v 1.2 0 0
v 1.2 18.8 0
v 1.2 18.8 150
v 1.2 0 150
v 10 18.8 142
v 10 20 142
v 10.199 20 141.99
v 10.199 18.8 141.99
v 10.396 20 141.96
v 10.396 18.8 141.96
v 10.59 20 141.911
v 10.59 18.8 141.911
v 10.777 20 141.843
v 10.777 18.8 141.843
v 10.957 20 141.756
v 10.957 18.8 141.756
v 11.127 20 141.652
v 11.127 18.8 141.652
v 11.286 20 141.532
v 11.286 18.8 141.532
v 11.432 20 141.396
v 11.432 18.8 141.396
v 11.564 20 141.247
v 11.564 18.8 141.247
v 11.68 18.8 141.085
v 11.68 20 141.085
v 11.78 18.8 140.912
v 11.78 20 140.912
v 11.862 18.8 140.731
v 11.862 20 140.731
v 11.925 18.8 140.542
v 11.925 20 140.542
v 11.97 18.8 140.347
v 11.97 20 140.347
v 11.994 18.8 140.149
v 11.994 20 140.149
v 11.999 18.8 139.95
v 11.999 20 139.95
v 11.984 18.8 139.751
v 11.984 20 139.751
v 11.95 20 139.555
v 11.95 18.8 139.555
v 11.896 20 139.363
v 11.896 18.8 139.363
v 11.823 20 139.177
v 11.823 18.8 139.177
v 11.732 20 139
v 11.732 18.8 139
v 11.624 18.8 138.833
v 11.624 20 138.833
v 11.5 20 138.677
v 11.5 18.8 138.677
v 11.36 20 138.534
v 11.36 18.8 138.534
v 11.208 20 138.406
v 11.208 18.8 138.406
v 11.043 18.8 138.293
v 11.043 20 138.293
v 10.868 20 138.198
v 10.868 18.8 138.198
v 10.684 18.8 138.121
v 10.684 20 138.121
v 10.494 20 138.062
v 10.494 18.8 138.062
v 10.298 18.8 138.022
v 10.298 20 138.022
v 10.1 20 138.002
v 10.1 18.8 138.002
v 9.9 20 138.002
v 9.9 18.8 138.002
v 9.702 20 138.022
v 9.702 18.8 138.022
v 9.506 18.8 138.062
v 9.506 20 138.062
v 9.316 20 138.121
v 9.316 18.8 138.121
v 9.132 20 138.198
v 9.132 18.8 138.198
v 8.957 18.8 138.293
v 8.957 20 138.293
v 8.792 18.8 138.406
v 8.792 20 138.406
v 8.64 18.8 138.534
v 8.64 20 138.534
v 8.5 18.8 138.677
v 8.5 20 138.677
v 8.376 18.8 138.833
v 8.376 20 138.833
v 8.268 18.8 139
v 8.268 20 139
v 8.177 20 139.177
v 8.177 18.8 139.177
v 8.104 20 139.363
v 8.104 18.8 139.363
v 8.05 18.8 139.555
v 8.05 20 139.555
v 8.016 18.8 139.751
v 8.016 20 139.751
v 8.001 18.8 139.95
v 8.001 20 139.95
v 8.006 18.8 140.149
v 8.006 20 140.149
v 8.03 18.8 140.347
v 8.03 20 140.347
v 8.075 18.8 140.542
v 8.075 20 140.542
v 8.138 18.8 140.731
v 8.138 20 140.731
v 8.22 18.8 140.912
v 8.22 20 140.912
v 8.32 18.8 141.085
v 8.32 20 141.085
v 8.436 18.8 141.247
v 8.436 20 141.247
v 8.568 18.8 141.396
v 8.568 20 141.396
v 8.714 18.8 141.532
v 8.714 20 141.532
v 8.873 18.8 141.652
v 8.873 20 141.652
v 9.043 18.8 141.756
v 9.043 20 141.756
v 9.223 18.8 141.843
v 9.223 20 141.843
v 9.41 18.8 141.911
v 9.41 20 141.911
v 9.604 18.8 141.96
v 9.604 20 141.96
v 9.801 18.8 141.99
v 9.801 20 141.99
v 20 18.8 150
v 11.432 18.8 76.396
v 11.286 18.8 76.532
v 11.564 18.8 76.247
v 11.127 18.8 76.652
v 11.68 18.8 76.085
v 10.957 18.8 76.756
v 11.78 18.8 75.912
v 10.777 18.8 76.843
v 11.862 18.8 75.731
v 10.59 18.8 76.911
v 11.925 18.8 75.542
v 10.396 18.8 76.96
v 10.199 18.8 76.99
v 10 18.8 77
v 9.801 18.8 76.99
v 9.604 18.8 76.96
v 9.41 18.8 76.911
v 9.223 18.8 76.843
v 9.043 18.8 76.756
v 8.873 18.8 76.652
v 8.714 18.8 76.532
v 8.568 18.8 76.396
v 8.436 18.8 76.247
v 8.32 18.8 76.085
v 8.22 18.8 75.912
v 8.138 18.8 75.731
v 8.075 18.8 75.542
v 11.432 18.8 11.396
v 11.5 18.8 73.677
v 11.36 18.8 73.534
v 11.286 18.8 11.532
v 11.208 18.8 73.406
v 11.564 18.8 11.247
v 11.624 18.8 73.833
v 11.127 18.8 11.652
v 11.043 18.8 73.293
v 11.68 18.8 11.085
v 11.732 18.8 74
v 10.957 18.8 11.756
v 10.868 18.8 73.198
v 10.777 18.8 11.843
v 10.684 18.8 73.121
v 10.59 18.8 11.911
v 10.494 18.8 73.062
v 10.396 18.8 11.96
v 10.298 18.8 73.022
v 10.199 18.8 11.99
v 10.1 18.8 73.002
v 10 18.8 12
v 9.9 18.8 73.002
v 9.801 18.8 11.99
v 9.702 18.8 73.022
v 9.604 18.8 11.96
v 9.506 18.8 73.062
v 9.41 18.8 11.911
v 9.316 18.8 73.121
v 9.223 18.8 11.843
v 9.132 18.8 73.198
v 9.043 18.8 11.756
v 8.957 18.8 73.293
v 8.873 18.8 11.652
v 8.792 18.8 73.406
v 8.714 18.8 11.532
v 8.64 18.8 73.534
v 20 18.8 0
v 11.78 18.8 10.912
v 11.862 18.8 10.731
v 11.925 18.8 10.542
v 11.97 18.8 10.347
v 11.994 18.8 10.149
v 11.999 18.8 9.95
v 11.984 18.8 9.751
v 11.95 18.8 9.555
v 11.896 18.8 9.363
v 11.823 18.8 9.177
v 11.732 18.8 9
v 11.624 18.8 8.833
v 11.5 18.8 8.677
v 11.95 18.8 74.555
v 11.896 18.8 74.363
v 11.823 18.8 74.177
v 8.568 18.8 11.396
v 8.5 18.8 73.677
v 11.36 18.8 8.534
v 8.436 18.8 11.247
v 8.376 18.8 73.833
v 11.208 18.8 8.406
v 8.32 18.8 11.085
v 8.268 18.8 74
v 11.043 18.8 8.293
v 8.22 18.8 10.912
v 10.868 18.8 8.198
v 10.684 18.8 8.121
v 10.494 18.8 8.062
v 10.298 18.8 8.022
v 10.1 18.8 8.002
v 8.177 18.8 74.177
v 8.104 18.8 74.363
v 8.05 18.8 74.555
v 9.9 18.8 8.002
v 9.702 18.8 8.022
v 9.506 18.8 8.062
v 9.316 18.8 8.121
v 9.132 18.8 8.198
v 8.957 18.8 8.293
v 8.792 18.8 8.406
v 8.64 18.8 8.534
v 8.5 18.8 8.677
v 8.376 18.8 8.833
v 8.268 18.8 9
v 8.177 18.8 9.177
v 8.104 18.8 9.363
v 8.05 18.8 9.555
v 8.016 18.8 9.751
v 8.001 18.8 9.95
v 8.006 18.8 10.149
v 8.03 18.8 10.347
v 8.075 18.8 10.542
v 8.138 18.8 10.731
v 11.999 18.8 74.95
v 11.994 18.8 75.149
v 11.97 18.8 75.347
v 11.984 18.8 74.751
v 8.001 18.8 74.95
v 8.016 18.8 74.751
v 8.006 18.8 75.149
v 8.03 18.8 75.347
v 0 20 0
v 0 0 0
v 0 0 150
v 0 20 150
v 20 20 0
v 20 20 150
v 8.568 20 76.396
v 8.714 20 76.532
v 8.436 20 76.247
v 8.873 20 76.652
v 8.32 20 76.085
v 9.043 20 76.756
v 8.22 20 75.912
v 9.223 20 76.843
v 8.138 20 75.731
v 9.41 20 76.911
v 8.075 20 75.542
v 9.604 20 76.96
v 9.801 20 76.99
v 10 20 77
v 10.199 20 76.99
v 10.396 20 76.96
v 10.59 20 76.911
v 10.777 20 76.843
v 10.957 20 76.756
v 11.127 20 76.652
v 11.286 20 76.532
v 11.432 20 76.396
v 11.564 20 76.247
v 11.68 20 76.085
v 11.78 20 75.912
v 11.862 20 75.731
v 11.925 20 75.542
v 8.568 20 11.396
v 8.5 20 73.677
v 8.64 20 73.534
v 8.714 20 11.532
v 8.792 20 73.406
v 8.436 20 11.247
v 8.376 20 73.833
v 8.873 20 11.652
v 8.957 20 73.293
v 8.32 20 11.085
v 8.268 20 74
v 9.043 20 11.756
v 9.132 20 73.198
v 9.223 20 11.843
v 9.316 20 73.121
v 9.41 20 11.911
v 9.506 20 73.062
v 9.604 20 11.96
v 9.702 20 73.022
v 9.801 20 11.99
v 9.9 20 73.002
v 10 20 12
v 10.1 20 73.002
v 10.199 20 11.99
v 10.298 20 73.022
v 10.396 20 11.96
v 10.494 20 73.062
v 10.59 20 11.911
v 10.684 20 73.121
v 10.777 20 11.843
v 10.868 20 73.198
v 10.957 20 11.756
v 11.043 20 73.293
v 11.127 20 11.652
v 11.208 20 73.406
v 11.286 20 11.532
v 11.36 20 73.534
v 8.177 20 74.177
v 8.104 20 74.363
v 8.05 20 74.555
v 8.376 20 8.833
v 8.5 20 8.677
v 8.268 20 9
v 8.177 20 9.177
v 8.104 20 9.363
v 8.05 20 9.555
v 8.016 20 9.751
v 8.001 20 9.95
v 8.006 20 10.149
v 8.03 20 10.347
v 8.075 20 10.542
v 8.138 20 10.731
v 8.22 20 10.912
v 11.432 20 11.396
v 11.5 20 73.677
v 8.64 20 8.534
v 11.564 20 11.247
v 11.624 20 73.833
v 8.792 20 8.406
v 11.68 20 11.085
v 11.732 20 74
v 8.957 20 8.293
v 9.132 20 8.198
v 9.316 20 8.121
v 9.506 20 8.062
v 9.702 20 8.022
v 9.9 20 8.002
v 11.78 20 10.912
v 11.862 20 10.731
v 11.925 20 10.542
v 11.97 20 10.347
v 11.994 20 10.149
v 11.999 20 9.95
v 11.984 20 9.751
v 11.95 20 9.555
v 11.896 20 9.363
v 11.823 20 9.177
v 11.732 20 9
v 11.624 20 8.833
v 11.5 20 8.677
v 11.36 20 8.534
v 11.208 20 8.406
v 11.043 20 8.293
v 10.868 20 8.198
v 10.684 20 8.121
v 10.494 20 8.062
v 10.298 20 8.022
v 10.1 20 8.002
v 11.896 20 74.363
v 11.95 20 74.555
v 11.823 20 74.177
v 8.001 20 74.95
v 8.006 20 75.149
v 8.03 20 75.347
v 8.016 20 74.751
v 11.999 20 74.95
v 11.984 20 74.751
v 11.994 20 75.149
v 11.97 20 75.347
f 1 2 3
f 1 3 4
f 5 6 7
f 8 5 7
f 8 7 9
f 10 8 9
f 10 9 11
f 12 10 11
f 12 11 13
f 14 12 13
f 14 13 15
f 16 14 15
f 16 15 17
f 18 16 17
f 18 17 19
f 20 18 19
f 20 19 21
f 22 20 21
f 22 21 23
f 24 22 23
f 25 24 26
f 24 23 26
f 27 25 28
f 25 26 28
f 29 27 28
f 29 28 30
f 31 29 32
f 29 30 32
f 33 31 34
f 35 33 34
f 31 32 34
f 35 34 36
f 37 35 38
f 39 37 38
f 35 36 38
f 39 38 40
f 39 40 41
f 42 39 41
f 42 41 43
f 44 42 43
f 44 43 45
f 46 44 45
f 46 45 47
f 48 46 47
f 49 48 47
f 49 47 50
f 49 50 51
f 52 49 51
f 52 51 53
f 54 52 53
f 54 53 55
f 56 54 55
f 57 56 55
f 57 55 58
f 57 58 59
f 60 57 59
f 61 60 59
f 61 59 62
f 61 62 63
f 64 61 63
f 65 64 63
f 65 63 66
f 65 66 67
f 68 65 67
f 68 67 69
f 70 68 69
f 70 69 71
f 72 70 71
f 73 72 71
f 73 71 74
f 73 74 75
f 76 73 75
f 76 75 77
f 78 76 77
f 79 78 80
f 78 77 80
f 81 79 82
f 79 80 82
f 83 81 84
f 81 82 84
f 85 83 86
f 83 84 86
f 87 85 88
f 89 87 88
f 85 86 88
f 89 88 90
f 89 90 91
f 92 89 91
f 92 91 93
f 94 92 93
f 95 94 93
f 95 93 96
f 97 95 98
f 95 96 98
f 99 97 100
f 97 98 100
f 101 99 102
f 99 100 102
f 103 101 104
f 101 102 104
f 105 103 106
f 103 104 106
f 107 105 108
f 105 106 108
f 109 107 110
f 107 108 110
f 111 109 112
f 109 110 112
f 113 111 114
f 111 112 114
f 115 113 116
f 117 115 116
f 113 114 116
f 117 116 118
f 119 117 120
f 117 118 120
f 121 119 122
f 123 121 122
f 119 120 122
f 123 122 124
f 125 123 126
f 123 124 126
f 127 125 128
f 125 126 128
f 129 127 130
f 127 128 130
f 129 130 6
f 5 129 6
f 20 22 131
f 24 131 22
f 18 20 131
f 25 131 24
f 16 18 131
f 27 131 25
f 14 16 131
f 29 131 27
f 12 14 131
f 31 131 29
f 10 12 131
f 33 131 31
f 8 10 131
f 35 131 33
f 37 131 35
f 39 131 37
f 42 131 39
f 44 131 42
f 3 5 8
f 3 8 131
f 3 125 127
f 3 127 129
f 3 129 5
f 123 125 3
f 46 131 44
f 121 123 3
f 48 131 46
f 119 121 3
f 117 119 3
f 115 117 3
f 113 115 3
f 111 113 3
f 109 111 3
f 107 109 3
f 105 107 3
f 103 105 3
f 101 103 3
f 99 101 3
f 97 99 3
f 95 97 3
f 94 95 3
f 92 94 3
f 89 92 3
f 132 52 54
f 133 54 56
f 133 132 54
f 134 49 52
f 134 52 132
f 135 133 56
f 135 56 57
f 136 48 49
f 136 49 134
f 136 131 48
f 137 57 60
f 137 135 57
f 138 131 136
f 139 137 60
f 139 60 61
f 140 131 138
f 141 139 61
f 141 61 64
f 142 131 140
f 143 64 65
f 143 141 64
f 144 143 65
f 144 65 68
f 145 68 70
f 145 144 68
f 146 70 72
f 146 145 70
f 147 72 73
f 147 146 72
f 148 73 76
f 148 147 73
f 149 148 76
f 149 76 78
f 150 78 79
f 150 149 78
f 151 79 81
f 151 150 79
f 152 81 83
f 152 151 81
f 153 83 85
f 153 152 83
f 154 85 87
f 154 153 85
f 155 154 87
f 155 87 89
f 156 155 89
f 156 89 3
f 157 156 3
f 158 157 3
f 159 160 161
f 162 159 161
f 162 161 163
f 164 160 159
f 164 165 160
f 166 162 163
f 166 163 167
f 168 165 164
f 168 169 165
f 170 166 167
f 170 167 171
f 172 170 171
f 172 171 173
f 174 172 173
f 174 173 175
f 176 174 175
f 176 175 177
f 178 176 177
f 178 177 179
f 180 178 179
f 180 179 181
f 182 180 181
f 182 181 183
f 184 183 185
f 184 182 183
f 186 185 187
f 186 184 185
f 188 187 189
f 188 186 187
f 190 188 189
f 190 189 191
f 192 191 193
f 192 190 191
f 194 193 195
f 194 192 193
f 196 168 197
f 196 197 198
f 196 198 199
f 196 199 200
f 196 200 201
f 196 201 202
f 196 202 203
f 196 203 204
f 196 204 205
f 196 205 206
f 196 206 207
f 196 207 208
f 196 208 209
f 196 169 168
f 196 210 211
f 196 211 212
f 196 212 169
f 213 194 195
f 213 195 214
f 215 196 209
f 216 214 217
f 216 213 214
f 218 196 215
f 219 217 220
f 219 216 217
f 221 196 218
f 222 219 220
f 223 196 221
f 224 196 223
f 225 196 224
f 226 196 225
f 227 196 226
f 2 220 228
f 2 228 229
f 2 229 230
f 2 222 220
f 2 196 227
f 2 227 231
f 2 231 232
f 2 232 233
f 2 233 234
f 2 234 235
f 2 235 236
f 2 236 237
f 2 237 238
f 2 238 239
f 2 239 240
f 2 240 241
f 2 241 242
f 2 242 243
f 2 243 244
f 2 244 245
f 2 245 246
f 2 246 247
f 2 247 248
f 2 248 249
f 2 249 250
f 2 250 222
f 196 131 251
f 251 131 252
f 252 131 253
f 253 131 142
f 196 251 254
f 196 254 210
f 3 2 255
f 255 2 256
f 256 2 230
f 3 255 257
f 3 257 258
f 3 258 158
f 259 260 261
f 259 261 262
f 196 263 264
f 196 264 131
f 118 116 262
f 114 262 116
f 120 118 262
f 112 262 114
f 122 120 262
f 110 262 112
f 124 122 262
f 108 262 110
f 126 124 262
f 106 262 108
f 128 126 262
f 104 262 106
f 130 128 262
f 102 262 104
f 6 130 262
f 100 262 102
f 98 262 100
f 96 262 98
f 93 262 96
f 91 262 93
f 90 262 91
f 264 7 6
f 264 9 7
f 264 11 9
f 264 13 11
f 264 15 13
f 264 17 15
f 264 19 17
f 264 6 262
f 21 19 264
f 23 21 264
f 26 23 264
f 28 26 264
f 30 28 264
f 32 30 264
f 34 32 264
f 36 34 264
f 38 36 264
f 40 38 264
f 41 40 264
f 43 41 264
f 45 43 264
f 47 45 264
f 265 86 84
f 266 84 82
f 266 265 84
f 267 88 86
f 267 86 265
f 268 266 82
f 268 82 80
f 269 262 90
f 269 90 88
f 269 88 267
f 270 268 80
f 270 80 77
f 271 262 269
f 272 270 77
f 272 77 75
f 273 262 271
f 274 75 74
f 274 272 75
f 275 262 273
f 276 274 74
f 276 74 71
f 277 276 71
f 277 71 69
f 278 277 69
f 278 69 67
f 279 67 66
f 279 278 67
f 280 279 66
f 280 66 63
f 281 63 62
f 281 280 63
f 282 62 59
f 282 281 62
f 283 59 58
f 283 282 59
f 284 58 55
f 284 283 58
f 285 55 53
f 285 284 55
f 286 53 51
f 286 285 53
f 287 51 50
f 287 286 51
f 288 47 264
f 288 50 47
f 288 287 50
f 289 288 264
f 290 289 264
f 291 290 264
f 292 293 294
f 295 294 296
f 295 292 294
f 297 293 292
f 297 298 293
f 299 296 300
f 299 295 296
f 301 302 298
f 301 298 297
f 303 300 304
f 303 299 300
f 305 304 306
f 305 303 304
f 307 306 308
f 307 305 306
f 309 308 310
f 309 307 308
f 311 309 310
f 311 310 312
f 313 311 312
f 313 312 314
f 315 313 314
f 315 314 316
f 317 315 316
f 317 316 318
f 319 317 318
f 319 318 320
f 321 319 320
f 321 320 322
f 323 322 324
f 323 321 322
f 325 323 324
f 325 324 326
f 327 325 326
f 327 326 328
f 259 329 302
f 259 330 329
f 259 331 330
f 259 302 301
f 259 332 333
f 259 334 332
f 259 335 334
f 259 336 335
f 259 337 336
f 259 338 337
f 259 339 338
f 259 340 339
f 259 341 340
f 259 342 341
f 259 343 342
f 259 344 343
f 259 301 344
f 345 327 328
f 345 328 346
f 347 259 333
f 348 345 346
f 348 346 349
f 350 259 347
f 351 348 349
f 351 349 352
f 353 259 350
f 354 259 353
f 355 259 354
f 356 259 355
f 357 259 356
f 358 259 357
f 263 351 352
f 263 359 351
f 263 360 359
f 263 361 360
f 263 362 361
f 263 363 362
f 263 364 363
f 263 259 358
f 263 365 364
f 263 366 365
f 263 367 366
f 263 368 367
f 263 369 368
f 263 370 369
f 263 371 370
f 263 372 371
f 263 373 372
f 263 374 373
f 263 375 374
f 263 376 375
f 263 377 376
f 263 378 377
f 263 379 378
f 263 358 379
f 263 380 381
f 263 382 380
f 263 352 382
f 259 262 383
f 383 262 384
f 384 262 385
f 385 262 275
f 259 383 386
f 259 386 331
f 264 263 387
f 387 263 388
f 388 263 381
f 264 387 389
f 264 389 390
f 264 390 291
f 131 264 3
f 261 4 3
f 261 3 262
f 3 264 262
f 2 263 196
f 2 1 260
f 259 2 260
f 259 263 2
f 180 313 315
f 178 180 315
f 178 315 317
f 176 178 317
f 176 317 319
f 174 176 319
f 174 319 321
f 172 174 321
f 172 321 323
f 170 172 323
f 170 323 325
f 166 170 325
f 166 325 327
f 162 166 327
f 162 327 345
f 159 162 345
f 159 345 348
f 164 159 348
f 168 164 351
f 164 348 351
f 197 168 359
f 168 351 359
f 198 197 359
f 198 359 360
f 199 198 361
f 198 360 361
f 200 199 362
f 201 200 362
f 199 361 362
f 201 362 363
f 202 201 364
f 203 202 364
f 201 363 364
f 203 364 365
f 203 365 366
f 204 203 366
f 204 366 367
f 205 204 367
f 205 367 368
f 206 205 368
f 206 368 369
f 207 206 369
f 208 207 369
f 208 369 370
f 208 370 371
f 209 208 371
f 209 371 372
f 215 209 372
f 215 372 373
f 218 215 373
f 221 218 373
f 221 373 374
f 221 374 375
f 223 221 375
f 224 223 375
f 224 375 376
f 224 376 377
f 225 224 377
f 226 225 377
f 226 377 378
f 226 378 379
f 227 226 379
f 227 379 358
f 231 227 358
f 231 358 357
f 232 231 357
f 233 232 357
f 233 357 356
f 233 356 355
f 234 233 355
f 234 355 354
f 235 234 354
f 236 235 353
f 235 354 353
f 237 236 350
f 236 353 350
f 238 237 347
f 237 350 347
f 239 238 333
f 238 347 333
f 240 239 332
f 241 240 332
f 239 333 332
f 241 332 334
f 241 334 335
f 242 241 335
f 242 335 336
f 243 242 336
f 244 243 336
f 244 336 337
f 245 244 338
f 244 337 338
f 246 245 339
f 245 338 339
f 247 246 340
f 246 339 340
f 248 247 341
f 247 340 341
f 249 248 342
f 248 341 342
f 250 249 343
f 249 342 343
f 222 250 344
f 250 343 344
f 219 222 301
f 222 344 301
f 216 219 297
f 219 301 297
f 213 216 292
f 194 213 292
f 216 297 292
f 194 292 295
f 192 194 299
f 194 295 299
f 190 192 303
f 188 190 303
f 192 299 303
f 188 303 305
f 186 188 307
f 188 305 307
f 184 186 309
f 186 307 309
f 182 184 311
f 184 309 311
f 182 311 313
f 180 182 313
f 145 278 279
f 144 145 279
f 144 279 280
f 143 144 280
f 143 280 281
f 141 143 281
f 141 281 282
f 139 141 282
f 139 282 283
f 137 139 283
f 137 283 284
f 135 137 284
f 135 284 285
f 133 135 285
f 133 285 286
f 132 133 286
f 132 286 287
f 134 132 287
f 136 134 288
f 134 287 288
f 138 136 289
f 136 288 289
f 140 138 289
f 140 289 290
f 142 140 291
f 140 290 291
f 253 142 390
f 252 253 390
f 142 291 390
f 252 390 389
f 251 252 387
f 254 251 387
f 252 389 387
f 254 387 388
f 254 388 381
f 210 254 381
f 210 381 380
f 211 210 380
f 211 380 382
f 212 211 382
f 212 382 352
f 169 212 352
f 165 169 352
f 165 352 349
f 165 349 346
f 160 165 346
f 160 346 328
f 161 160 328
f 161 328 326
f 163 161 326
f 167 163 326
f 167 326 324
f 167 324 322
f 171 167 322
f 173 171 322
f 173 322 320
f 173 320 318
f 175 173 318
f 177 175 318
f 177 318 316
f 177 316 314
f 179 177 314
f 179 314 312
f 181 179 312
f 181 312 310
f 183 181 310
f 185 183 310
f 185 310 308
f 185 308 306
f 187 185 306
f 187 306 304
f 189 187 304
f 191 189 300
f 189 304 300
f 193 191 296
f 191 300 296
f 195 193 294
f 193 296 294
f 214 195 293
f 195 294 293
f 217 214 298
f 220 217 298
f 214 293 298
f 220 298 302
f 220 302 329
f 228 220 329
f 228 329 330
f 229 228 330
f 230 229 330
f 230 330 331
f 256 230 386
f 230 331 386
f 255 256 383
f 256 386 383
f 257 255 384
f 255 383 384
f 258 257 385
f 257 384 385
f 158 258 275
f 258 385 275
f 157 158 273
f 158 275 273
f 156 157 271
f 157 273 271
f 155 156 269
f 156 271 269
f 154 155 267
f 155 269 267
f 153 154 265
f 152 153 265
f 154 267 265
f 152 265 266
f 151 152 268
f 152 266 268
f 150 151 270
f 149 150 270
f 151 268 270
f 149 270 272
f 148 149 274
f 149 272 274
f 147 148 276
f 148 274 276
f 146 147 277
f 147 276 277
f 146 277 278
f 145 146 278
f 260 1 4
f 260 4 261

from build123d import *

# Parameters (mm, degrees)
BOSS_EXTRUDE1_DEPTH = 150
SKETCH2_R           = 2
CUT_EXTRUDE1_DEPTH  = 10


with BuildPart() as part:
    # Sketch1 → Boss-Extrude1 (new body)
    with BuildSketch(Plane.XY):
        Polygon((0, 0), (0, 20), (20, 20), (20, 18.8), (1.2, 18.8), (1.2, 0), align=None)
    extrude(amount=BOSS_EXTRUDE1_DEPTH)

    # Sketch2 → Cut-Extrude1 (cut)
    with BuildSketch(Plane(origin=(0, 20, 0), x_dir=(1, 0, 0), z_dir=(0, 1, 0))):
        with Locations(Location((10, -75, 0), (0, 0, 270))):
            Circle(SKETCH2_R)
        with Locations(Location((10, -10, 0), (0, 0, 270))):
            Circle(SKETCH2_R)
        with Locations(Location((10, -140, 0), (0, 0, 270))):
            Circle(SKETCH2_R)
    extrude(amount=-CUT_EXTRUDE1_DEPTH, mode=Mode.SUBTRACT)


solid = part.part
